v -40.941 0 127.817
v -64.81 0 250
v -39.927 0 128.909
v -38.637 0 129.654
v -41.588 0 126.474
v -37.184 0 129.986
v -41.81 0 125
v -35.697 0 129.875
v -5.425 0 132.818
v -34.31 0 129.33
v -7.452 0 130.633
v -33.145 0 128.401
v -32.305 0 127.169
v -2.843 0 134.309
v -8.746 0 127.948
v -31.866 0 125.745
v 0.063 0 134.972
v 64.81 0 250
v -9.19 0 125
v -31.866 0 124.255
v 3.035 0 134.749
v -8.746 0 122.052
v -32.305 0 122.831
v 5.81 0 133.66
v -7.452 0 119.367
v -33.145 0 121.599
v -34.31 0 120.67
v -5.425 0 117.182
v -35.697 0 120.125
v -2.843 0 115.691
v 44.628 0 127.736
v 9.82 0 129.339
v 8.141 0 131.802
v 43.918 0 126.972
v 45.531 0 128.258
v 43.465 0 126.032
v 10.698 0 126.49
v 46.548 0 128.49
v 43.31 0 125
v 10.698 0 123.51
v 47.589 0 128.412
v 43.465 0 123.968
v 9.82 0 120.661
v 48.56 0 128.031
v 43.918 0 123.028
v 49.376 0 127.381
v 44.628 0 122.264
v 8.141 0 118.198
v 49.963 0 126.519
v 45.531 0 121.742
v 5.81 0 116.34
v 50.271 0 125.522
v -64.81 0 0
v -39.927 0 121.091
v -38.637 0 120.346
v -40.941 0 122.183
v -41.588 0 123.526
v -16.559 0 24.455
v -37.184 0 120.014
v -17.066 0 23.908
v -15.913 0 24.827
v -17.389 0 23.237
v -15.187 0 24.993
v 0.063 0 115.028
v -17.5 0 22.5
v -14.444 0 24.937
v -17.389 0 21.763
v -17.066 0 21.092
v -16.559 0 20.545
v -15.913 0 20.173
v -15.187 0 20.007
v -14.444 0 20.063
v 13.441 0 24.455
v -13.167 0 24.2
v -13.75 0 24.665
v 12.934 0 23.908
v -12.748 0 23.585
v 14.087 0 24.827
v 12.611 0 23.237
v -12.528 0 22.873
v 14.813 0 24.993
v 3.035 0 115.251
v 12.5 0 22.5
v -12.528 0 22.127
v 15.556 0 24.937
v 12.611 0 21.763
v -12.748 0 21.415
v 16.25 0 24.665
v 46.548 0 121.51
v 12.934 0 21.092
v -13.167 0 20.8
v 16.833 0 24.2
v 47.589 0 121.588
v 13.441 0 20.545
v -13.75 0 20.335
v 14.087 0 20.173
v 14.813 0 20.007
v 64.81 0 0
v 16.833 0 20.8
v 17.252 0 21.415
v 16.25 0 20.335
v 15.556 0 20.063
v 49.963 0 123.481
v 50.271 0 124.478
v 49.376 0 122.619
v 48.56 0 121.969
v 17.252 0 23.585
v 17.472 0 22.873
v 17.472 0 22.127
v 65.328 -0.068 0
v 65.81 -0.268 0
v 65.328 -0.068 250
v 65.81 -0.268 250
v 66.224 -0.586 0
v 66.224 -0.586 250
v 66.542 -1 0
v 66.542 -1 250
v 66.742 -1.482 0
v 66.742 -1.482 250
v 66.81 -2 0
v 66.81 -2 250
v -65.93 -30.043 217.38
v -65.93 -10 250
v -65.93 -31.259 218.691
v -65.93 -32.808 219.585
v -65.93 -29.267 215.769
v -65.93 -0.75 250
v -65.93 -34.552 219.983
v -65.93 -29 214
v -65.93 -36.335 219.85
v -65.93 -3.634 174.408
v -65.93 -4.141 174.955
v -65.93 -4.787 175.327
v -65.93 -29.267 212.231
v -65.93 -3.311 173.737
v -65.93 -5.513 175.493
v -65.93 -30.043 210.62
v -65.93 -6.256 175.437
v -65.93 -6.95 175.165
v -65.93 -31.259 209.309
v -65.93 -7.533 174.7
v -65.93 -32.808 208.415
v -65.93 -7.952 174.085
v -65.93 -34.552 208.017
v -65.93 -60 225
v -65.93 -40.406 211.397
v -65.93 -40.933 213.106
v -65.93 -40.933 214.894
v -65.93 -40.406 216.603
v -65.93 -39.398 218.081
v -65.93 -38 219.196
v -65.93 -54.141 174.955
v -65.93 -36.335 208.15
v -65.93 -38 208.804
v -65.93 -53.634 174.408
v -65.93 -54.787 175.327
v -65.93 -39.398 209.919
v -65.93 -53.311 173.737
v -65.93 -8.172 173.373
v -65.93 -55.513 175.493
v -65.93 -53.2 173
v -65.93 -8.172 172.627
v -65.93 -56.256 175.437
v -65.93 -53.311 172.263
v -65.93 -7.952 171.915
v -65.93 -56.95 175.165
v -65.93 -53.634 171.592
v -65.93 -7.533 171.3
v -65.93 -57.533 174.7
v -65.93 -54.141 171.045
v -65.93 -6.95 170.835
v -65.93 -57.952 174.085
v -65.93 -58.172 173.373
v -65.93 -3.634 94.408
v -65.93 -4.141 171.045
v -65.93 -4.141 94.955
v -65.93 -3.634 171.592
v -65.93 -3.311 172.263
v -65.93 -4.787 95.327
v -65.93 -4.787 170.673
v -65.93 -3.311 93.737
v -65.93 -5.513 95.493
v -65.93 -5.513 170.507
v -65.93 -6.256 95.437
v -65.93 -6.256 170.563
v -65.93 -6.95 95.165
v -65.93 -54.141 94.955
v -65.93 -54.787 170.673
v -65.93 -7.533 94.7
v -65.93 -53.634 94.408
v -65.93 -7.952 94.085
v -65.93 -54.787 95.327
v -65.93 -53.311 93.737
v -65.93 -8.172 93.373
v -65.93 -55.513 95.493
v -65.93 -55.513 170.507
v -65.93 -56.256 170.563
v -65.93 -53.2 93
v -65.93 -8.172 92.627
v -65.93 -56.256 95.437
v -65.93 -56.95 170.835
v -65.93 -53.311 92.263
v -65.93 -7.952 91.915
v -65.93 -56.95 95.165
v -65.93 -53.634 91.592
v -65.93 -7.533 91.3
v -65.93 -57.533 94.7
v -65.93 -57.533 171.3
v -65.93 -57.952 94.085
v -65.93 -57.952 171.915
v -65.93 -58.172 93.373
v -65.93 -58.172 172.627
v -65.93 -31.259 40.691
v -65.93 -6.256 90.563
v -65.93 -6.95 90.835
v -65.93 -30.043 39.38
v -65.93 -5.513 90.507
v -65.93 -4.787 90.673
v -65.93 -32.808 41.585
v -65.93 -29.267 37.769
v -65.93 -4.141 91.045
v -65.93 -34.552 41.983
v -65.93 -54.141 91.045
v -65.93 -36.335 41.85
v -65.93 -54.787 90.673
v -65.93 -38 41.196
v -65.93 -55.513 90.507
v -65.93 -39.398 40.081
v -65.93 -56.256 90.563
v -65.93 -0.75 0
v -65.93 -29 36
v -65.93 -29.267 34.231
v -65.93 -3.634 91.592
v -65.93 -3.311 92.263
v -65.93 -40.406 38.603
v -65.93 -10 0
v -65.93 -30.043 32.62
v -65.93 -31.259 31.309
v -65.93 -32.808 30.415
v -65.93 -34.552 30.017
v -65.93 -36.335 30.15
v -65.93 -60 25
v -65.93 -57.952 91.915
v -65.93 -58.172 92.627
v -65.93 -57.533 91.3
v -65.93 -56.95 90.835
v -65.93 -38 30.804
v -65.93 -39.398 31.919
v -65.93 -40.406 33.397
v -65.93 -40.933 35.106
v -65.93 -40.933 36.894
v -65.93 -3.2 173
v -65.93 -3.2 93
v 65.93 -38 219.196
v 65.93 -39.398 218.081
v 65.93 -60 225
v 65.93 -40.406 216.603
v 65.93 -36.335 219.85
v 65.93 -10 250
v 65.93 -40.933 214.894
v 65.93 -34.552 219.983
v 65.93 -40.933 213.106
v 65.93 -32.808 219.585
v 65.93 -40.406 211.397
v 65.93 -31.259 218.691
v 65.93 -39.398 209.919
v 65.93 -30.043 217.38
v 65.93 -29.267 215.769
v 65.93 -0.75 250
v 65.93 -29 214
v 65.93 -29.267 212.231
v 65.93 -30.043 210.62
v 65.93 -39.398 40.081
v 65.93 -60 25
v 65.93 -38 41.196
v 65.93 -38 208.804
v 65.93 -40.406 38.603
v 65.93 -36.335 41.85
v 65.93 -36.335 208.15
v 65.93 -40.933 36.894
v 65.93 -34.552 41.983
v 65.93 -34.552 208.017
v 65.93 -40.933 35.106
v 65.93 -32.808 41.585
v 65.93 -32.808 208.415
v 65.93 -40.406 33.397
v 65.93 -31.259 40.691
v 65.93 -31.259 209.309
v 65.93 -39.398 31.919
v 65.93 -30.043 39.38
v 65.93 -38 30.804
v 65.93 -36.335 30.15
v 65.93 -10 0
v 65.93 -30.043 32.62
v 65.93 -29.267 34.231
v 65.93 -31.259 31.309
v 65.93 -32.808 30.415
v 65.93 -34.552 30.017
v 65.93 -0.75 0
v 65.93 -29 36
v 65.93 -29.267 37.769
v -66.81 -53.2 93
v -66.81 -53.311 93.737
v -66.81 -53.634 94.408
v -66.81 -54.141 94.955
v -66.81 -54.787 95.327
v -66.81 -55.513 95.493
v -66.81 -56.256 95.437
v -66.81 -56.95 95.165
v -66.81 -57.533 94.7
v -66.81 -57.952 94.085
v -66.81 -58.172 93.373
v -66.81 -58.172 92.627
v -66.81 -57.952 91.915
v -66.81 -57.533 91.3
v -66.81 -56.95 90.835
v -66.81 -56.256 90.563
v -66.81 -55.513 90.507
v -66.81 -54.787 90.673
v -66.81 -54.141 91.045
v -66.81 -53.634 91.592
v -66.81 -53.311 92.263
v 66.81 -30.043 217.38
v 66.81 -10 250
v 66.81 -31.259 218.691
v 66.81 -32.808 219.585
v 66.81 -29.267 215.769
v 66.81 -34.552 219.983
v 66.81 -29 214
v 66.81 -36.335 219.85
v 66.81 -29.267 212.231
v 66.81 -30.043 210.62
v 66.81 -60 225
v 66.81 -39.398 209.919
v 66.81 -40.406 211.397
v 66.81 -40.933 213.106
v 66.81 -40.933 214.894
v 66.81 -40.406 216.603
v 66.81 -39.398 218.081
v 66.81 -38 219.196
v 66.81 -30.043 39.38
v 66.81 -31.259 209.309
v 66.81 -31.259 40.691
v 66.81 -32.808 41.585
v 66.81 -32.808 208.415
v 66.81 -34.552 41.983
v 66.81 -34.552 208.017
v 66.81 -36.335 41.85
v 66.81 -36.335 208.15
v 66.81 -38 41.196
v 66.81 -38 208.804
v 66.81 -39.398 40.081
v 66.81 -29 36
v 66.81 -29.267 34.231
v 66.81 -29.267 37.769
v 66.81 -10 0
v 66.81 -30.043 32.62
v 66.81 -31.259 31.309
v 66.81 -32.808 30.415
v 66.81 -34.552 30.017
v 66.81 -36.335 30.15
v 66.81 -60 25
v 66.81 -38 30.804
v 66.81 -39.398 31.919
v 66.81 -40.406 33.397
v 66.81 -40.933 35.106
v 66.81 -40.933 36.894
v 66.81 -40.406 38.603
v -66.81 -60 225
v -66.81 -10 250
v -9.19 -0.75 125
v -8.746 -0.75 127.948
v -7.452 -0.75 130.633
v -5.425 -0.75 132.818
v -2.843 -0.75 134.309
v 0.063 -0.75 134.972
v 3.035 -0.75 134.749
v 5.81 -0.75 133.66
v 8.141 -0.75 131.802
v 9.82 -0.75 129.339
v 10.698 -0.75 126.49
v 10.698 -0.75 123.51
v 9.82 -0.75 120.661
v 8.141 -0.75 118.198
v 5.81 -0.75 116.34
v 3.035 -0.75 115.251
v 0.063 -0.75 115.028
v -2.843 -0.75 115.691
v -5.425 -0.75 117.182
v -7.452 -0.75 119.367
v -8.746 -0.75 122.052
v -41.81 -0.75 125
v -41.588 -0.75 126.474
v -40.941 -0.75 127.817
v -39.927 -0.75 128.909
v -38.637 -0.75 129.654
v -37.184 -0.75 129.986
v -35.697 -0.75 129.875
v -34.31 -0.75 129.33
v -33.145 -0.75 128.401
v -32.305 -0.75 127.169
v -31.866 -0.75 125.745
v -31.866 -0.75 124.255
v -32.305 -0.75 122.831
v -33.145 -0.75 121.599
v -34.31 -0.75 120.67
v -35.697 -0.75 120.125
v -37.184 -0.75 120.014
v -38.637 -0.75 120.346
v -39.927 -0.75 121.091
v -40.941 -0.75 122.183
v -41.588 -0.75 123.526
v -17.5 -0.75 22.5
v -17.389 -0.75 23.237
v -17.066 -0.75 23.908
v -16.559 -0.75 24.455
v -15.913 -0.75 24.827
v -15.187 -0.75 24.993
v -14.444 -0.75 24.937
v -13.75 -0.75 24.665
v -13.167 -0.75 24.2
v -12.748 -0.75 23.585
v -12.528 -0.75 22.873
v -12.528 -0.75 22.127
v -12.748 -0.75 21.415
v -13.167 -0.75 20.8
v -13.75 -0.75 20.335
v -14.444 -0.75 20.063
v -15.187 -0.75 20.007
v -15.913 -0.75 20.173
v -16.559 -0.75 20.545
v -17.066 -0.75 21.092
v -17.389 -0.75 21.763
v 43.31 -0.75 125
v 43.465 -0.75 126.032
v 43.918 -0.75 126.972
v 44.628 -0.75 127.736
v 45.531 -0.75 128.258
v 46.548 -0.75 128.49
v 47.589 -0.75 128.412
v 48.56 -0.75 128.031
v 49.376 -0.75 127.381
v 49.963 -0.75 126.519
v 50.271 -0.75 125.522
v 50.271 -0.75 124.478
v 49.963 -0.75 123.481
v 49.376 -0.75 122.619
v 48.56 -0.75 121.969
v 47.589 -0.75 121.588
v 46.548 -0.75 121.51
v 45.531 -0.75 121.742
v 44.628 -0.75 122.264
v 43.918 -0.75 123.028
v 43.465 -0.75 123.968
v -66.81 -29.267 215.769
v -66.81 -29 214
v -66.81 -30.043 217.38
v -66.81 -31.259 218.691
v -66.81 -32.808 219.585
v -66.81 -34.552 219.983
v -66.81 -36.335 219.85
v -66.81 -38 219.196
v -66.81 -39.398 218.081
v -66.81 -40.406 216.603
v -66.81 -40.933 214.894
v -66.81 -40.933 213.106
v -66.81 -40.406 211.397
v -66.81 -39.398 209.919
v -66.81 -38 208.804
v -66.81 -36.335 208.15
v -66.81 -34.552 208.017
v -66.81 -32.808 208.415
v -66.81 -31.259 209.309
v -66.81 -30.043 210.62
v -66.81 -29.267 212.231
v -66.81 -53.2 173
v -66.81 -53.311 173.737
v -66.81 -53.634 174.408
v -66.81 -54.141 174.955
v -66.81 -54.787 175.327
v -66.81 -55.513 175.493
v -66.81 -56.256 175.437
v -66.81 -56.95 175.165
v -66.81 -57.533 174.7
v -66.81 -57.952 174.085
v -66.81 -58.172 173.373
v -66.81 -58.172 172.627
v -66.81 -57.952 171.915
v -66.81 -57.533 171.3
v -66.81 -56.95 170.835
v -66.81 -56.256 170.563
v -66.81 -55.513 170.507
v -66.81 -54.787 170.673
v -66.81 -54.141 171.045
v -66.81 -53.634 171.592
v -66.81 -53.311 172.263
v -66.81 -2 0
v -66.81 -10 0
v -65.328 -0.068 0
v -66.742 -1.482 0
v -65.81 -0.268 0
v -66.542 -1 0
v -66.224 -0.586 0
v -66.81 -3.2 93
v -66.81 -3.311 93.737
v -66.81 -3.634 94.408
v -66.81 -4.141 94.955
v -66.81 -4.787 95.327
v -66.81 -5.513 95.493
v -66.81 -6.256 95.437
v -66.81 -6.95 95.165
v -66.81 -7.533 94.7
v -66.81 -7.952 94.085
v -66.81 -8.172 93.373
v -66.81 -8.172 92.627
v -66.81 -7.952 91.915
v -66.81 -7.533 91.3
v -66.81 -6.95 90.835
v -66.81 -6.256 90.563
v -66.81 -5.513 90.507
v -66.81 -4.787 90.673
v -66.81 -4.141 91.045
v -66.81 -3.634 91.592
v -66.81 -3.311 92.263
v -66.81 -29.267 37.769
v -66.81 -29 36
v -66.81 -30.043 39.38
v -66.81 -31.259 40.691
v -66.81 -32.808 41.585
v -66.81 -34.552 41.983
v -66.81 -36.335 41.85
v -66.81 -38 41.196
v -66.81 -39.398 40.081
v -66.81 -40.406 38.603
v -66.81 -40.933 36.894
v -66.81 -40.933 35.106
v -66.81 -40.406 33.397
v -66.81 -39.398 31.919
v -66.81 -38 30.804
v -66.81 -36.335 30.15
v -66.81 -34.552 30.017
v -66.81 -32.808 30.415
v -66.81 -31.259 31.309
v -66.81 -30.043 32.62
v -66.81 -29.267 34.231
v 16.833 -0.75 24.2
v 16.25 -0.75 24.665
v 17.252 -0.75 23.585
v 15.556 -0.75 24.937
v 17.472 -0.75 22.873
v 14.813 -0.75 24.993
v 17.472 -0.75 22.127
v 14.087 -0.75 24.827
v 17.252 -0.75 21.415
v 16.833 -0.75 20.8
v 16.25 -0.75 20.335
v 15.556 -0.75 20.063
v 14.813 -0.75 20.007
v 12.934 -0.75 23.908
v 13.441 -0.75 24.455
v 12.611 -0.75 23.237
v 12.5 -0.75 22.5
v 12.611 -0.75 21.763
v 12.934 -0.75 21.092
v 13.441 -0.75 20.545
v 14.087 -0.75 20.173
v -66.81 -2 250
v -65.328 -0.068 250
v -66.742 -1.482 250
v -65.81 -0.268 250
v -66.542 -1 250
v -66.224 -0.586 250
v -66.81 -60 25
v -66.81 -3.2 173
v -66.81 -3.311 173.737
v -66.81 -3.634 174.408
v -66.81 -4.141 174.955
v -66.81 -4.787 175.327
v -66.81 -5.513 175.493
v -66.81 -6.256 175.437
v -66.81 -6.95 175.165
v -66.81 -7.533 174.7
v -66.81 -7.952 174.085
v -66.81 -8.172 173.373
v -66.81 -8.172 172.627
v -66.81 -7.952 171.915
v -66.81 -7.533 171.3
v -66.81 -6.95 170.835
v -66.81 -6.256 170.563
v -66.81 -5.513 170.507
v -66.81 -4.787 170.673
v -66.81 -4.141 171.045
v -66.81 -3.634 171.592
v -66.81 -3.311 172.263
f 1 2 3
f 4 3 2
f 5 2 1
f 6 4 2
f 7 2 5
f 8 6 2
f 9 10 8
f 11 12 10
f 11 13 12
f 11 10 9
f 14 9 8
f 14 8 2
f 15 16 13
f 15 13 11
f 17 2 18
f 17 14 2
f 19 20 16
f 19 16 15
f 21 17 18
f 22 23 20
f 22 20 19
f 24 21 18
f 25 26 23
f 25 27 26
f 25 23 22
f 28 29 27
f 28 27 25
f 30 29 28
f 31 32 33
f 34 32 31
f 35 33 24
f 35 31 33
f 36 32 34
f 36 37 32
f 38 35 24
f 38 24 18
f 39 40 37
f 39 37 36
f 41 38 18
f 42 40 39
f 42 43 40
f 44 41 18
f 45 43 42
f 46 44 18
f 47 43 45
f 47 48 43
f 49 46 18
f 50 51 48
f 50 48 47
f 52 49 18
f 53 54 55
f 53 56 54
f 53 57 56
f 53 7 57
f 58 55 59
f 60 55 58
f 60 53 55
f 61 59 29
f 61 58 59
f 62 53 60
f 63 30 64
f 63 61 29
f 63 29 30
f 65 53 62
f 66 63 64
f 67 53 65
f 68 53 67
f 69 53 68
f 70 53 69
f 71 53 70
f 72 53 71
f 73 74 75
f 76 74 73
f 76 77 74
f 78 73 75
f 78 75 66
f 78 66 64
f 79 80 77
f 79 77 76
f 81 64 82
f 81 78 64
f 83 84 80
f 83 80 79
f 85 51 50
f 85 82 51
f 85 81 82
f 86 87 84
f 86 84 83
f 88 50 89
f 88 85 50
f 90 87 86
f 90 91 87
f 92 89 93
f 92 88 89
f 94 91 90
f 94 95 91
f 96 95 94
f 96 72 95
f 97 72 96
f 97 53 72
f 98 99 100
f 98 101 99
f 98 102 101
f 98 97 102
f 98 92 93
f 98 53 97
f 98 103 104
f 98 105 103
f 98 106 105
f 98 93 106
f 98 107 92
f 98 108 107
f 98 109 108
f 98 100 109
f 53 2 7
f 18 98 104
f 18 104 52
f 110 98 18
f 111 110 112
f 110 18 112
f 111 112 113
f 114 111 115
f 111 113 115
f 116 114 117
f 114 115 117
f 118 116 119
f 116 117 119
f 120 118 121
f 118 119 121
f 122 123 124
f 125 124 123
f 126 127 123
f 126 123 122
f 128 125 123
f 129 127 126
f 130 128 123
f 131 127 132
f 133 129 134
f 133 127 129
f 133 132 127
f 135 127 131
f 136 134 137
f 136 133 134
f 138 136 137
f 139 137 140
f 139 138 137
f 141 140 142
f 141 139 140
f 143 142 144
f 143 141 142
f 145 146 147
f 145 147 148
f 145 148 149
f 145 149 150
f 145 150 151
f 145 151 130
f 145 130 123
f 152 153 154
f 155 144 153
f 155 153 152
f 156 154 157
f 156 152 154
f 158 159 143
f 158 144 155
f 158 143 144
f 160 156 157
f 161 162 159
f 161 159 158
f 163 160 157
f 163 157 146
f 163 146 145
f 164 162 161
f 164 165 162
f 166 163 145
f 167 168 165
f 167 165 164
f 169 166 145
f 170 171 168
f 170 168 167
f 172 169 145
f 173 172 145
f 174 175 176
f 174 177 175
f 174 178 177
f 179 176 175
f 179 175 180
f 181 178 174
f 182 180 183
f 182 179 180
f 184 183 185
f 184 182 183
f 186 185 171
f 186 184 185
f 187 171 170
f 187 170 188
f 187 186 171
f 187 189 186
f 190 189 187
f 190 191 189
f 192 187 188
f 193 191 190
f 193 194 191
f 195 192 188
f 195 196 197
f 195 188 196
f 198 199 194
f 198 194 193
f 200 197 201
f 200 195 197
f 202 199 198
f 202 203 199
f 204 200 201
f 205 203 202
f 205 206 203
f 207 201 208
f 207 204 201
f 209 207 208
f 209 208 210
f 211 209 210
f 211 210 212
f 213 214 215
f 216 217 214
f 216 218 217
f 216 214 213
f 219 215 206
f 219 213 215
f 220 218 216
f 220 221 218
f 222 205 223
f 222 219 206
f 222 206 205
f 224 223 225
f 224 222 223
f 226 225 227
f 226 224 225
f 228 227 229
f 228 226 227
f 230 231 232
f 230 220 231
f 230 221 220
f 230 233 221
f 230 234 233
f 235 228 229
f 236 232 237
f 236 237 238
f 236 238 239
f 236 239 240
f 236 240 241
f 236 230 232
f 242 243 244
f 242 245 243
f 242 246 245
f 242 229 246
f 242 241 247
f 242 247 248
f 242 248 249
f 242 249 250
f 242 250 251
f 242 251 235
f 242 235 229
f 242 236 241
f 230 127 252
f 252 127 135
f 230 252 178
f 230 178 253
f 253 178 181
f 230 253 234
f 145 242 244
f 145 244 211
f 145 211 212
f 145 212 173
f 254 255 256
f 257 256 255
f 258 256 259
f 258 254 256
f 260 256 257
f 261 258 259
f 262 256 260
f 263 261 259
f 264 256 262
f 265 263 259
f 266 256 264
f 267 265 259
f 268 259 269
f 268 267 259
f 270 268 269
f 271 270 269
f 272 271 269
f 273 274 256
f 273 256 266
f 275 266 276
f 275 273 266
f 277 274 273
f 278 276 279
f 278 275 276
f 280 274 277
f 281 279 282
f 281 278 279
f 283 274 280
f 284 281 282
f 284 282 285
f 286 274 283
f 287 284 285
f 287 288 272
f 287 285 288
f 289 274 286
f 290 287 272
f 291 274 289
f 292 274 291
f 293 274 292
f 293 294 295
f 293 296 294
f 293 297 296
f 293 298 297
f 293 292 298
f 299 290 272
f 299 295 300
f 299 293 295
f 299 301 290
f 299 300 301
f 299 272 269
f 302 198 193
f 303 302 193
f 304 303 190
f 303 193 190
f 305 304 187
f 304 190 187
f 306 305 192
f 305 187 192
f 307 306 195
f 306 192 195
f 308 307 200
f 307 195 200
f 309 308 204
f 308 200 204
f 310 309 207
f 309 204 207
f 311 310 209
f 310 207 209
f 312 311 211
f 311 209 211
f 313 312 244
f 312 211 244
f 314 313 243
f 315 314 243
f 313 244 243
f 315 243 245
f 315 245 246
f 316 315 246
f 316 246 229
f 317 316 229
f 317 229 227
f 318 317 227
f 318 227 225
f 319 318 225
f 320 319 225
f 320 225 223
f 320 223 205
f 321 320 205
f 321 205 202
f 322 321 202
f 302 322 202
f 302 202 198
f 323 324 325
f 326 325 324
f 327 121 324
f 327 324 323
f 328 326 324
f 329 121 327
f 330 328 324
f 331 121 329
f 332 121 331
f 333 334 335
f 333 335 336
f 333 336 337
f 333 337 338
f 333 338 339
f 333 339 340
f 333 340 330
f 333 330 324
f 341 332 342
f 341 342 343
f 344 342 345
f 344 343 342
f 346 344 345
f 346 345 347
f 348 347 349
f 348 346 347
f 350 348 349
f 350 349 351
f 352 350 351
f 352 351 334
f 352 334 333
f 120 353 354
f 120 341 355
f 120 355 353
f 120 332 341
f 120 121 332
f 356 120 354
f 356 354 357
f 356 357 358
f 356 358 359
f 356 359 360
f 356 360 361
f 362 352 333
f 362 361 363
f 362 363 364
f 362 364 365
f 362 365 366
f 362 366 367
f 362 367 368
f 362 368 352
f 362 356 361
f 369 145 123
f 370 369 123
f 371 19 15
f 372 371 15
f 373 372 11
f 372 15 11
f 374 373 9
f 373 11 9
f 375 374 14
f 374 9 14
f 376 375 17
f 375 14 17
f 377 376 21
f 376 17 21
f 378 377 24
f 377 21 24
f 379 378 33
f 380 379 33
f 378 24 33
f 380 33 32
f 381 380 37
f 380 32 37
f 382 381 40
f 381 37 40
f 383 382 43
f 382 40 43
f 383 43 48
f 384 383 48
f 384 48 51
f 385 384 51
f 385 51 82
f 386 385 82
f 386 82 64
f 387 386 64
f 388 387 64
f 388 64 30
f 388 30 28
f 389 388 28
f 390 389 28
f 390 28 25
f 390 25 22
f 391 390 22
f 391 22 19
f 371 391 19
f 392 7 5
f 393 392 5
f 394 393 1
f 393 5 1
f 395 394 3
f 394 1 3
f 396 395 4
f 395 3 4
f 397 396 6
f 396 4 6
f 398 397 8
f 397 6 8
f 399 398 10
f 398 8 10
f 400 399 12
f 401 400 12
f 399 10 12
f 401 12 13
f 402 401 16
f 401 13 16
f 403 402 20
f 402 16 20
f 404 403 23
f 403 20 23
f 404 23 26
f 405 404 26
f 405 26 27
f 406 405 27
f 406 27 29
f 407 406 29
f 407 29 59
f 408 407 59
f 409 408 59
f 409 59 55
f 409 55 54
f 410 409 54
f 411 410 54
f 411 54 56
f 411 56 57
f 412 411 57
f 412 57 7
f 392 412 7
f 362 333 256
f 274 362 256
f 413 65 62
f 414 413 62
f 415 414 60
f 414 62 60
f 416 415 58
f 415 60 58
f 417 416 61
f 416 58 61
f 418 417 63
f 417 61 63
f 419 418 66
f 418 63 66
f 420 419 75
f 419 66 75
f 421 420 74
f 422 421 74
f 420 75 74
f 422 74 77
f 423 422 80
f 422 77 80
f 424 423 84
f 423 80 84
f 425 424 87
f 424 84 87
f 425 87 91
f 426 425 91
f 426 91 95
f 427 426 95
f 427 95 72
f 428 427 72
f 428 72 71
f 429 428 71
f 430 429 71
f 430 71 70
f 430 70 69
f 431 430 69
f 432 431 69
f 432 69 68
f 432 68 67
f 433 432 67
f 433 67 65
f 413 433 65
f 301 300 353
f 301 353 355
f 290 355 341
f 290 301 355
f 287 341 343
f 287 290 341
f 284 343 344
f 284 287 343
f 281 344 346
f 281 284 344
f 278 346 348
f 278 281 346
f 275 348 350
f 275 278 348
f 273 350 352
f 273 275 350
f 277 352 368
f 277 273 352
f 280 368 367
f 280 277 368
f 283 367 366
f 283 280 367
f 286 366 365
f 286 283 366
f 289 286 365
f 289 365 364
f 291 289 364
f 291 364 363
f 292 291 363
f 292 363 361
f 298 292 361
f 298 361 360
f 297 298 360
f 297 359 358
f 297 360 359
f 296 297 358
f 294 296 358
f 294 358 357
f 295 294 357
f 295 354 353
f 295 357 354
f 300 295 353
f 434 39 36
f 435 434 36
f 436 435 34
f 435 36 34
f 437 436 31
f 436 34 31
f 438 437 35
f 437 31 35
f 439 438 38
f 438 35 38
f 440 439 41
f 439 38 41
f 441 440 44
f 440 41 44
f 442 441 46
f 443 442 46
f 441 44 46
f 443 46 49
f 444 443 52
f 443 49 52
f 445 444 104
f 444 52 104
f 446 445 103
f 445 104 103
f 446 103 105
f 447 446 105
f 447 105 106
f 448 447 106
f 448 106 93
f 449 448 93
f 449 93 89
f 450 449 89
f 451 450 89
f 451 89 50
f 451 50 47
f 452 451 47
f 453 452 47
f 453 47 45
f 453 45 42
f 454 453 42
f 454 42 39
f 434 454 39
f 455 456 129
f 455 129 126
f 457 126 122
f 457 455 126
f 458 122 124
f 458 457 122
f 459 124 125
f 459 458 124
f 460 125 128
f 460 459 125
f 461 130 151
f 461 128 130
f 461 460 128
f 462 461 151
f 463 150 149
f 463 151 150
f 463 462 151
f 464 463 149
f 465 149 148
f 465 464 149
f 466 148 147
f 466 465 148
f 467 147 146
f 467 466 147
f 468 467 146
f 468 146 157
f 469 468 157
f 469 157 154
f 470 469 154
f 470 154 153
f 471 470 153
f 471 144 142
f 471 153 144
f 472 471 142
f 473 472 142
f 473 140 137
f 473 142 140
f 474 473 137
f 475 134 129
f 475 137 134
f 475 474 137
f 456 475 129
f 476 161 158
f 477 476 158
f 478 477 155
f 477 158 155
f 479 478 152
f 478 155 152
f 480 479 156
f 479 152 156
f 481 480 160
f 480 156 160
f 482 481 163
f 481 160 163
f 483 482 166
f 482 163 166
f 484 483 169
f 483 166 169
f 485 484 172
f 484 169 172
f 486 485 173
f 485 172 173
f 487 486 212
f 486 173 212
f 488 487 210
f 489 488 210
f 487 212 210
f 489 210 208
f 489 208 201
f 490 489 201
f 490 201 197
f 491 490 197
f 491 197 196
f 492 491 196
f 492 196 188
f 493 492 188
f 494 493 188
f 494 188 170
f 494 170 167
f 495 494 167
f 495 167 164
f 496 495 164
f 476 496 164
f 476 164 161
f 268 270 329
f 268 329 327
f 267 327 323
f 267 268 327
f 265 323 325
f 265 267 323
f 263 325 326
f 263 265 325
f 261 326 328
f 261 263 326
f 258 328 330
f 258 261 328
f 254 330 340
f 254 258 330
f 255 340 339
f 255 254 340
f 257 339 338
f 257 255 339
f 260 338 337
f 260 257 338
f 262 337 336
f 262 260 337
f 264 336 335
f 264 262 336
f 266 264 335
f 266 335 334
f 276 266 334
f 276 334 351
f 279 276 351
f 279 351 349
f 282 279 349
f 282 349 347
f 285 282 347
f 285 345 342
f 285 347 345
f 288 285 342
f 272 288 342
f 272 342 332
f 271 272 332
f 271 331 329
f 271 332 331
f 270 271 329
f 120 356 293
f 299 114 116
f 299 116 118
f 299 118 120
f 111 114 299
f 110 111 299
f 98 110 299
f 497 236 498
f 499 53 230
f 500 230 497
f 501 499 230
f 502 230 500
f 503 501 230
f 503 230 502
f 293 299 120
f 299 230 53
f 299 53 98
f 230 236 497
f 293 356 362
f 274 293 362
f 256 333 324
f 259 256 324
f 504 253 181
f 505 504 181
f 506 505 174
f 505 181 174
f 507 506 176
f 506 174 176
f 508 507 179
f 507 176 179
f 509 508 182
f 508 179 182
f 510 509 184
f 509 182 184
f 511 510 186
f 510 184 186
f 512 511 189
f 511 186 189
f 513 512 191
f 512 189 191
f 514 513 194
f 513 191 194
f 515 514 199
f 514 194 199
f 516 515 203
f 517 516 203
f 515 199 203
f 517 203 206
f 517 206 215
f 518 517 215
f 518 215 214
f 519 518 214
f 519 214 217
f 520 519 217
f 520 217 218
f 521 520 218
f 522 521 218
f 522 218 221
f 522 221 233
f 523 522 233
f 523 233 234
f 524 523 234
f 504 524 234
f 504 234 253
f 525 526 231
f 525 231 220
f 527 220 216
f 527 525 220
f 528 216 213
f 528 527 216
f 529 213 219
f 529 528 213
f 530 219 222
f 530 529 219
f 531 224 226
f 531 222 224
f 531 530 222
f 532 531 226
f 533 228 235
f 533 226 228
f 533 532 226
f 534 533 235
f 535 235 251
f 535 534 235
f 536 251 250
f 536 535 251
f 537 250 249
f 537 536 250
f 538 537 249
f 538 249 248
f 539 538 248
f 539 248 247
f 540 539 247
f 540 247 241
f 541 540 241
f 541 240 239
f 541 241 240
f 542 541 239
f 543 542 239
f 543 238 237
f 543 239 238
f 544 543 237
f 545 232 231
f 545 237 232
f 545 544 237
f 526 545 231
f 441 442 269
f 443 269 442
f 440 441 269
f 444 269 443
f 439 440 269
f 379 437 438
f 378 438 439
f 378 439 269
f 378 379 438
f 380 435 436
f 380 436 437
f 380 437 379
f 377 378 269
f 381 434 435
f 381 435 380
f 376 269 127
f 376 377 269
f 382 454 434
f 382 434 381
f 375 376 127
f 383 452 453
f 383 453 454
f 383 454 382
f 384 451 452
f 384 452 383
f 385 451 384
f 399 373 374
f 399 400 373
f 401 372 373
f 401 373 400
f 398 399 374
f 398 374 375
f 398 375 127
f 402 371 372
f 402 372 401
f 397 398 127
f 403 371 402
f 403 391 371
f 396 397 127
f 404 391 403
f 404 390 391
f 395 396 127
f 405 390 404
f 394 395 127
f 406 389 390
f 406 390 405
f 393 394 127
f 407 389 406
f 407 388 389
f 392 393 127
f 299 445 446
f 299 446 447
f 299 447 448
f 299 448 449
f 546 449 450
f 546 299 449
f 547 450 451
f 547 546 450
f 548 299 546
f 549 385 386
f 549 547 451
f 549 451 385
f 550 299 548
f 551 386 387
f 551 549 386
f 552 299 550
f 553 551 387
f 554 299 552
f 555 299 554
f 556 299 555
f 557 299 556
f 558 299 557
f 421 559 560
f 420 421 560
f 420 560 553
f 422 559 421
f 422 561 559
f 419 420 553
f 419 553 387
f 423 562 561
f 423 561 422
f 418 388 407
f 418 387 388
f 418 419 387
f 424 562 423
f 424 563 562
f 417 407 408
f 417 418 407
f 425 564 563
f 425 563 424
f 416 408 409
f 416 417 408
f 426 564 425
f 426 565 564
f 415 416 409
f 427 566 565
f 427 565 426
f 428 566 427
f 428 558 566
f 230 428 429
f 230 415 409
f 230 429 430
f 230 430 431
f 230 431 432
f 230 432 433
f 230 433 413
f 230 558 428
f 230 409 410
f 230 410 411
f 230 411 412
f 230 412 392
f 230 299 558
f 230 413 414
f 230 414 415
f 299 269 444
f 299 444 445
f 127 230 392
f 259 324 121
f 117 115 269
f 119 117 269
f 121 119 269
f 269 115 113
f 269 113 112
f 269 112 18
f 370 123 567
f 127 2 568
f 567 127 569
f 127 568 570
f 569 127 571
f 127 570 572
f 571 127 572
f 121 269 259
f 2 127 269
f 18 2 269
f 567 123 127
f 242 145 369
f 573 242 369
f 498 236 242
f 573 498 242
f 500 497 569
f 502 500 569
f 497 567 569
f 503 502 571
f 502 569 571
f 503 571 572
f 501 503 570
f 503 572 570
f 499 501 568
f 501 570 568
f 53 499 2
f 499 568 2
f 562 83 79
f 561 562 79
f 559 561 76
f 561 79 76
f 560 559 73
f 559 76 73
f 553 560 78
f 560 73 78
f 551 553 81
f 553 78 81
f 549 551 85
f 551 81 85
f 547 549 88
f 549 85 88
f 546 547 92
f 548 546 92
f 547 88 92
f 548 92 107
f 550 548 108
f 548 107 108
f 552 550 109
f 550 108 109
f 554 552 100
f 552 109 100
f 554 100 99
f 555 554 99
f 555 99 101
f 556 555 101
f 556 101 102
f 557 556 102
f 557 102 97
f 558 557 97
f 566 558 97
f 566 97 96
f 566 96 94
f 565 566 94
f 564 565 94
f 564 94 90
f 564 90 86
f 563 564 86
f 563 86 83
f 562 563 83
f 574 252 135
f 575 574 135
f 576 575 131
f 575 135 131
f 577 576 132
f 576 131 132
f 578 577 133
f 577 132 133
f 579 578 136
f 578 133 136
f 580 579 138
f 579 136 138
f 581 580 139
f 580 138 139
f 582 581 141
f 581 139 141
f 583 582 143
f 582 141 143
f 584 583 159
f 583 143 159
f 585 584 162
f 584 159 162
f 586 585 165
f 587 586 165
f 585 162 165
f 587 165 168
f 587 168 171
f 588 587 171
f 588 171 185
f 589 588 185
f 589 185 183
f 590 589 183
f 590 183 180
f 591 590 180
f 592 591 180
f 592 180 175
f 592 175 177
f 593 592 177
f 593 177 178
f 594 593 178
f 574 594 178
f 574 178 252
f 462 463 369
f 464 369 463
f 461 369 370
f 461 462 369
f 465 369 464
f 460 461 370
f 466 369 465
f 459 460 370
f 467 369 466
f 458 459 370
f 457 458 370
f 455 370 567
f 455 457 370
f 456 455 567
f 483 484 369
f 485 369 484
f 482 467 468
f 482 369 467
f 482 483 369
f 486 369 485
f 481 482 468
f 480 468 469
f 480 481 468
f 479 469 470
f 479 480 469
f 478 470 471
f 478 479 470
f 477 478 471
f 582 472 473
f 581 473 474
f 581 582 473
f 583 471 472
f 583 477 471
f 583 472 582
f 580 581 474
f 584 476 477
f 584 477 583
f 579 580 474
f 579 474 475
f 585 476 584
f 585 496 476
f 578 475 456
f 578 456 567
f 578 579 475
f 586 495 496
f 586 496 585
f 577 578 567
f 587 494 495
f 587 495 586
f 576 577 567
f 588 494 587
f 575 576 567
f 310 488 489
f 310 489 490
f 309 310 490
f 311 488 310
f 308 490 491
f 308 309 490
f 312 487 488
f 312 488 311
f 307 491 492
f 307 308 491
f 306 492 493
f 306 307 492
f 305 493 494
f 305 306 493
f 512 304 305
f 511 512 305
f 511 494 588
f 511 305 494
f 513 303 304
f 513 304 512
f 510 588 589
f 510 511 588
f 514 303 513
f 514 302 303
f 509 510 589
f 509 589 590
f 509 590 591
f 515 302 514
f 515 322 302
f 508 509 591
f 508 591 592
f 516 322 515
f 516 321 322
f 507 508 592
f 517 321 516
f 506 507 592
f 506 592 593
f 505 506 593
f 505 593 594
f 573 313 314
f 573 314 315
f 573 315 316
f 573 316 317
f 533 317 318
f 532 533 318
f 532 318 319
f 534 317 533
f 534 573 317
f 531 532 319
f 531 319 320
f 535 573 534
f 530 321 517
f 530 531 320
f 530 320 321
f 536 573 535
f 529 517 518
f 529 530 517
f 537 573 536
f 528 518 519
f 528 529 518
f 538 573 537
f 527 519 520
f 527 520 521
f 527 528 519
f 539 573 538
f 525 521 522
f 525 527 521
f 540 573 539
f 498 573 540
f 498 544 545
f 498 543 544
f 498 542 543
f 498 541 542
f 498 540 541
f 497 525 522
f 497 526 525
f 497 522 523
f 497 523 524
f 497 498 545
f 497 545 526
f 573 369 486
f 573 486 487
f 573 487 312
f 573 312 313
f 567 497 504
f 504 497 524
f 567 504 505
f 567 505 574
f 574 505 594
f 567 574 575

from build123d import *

# Parameters (mm, degrees)
BOSS_EXTRUDE1_DEPTH     = 250
CUT_EXTRUDE1_DEPTH      = 250
CUT_EXTRUDE2_DEPTH      = 290.7486918
CUT_EXTRUDE2_DEPTH_BACK = 290.7486918
SKETCH3_R               = 6
FILLET1_R               = 2
SKETCH5_R               = 10
CUT_EXTRUDE3_DEPTH      = 10
SKETCH6_R               = 2.5
CUT_EXTRUDE4_DEPTH      = 10
SKETCH7_R               = 3.5
SKETCH7_R_2             = 5
CUT_EXTRUDE5_DEPTH      = 10
SKETCH9_R               = 2.5
CUT_EXTRUDE8_DEPTH      = 14


with BuildPart() as part:
    # Sketch1 → Boss-Extrude1 (new body)
    with BuildSketch(Plane.XY):
        Polygon((-66.81, -60), (-66.81, 0), (66.81, 0), (66.81, -60), (65.93, -60), (65.93, -0.75), (-65.93, -0.75), (-65.93, -60), align=None)
    extrude(amount=BOSS_EXTRUDE1_DEPTH)

    # Sketch2 → Cut-Extrude1 (cut)
    with BuildSketch(Plane(origin=(66.81, 0, 0), x_dir=(0, 0, -1), z_dir=(1, 0, 0))):
        Polygon((-225, -60), (-250, -10), (-250, -60), align=None)
        Polygon((0, -10), (-25, -60), (0, -60), align=None)
    extrude(amount=-CUT_EXTRUDE1_DEPTH, mode=Mode.SUBTRACT)

    # Sketch3 → Cut-Extrude2 (cut, two sides: drawn at the far end of the back side and taken through both)
    with BuildSketch(Plane(origin=(66.81, 0, 0), x_dir=(0, 0, -1), z_dir=(1, 0, 0)).offset(-CUT_EXTRUDE2_DEPTH_BACK)):
        with Locations(Location((-214, -35, 0), (0, 0, 90))):
            Circle(SKETCH3_R)
        with Locations(Location((-36, -35, 0), (0, 0, 90))):
            Circle(SKETCH3_R)
    extrude(amount=CUT_EXTRUDE2_DEPTH + CUT_EXTRUDE2_DEPTH_BACK, mode=Mode.SUBTRACT)

    # Fillet1
    fillet1_edges = [part.edges().sort_by_distance(p)[0] for p in [
        (-66.81, 0, 125),
        (66.81, 0, 125),
    ]]
    fillet(fillet1_edges, radius=FILLET1_R)

    # Sketch5 → Cut-Extrude3 (cut)
    with BuildSketch(Plane(origin=(0, 0, 0), x_dir=(1, 0, 0), z_dir=(0, 1, 0))):
        with Locations(Location((0.81, -125, 0), (0, 0, 180))):
            Circle(SKETCH5_R)
    extrude(amount=-CUT_EXTRUDE3_DEPTH, mode=Mode.SUBTRACT)

    # Sketch6 → Cut-Extrude4 (cut)
    with BuildSketch(Plane(origin=(-65.93, 0, 0), x_dir=(0, 0, -1), z_dir=(1, 0, 0))):
        with Locations(Location((-173, -55.7, 0), (0, 0, 90))):
            Circle(SKETCH6_R)
        with Locations(Location((-93, -55.7, 0), (0, 0, 90))):
            Circle(SKETCH6_R)
        with Locations(Location((-93, -5.7, 0), (0, 0, 90))):
            Circle(SKETCH6_R)
        with Locations(Location((-173, -5.7, 0), (0, 0, 90))):
            Circle(SKETCH6_R)
    extrude(amount=-CUT_EXTRUDE4_DEPTH, mode=Mode.SUBTRACT)

    # Sketch7 → Cut-Extrude5 (cut)
    with BuildSketch(Plane(origin=(0, 0, 0), x_dir=(1, 0, 0), z_dir=(0, 1, 0))):
        with Locations(Location((46.81, -125, 0), (0, 0, 180))):
            Circle(SKETCH7_R)
        with Locations(Location((-36.81, -125, 0), (0, 0, 180))):
            Circle(SKETCH7_R_2)
    extrude(amount=-CUT_EXTRUDE5_DEPTH, mode=Mode.SUBTRACT)

    # Sketch9 → Cut-Extrude8 (cut)
    with BuildSketch(Plane(origin=(0, 0, 0), x_dir=(1, 0, 0), z_dir=(0, 1, 0))):
        with Locations(Location((-15, -22.5, 0), (0, 0, 180))):
            Circle(SKETCH9_R)
        with Locations(Location((15, -22.5, 0), (0, 0, 180))):
            Circle(SKETCH9_R)
    extrude(amount=-CUT_EXTRUDE8_DEPTH, mode=Mode.SUBTRACT)


solid = part.part
